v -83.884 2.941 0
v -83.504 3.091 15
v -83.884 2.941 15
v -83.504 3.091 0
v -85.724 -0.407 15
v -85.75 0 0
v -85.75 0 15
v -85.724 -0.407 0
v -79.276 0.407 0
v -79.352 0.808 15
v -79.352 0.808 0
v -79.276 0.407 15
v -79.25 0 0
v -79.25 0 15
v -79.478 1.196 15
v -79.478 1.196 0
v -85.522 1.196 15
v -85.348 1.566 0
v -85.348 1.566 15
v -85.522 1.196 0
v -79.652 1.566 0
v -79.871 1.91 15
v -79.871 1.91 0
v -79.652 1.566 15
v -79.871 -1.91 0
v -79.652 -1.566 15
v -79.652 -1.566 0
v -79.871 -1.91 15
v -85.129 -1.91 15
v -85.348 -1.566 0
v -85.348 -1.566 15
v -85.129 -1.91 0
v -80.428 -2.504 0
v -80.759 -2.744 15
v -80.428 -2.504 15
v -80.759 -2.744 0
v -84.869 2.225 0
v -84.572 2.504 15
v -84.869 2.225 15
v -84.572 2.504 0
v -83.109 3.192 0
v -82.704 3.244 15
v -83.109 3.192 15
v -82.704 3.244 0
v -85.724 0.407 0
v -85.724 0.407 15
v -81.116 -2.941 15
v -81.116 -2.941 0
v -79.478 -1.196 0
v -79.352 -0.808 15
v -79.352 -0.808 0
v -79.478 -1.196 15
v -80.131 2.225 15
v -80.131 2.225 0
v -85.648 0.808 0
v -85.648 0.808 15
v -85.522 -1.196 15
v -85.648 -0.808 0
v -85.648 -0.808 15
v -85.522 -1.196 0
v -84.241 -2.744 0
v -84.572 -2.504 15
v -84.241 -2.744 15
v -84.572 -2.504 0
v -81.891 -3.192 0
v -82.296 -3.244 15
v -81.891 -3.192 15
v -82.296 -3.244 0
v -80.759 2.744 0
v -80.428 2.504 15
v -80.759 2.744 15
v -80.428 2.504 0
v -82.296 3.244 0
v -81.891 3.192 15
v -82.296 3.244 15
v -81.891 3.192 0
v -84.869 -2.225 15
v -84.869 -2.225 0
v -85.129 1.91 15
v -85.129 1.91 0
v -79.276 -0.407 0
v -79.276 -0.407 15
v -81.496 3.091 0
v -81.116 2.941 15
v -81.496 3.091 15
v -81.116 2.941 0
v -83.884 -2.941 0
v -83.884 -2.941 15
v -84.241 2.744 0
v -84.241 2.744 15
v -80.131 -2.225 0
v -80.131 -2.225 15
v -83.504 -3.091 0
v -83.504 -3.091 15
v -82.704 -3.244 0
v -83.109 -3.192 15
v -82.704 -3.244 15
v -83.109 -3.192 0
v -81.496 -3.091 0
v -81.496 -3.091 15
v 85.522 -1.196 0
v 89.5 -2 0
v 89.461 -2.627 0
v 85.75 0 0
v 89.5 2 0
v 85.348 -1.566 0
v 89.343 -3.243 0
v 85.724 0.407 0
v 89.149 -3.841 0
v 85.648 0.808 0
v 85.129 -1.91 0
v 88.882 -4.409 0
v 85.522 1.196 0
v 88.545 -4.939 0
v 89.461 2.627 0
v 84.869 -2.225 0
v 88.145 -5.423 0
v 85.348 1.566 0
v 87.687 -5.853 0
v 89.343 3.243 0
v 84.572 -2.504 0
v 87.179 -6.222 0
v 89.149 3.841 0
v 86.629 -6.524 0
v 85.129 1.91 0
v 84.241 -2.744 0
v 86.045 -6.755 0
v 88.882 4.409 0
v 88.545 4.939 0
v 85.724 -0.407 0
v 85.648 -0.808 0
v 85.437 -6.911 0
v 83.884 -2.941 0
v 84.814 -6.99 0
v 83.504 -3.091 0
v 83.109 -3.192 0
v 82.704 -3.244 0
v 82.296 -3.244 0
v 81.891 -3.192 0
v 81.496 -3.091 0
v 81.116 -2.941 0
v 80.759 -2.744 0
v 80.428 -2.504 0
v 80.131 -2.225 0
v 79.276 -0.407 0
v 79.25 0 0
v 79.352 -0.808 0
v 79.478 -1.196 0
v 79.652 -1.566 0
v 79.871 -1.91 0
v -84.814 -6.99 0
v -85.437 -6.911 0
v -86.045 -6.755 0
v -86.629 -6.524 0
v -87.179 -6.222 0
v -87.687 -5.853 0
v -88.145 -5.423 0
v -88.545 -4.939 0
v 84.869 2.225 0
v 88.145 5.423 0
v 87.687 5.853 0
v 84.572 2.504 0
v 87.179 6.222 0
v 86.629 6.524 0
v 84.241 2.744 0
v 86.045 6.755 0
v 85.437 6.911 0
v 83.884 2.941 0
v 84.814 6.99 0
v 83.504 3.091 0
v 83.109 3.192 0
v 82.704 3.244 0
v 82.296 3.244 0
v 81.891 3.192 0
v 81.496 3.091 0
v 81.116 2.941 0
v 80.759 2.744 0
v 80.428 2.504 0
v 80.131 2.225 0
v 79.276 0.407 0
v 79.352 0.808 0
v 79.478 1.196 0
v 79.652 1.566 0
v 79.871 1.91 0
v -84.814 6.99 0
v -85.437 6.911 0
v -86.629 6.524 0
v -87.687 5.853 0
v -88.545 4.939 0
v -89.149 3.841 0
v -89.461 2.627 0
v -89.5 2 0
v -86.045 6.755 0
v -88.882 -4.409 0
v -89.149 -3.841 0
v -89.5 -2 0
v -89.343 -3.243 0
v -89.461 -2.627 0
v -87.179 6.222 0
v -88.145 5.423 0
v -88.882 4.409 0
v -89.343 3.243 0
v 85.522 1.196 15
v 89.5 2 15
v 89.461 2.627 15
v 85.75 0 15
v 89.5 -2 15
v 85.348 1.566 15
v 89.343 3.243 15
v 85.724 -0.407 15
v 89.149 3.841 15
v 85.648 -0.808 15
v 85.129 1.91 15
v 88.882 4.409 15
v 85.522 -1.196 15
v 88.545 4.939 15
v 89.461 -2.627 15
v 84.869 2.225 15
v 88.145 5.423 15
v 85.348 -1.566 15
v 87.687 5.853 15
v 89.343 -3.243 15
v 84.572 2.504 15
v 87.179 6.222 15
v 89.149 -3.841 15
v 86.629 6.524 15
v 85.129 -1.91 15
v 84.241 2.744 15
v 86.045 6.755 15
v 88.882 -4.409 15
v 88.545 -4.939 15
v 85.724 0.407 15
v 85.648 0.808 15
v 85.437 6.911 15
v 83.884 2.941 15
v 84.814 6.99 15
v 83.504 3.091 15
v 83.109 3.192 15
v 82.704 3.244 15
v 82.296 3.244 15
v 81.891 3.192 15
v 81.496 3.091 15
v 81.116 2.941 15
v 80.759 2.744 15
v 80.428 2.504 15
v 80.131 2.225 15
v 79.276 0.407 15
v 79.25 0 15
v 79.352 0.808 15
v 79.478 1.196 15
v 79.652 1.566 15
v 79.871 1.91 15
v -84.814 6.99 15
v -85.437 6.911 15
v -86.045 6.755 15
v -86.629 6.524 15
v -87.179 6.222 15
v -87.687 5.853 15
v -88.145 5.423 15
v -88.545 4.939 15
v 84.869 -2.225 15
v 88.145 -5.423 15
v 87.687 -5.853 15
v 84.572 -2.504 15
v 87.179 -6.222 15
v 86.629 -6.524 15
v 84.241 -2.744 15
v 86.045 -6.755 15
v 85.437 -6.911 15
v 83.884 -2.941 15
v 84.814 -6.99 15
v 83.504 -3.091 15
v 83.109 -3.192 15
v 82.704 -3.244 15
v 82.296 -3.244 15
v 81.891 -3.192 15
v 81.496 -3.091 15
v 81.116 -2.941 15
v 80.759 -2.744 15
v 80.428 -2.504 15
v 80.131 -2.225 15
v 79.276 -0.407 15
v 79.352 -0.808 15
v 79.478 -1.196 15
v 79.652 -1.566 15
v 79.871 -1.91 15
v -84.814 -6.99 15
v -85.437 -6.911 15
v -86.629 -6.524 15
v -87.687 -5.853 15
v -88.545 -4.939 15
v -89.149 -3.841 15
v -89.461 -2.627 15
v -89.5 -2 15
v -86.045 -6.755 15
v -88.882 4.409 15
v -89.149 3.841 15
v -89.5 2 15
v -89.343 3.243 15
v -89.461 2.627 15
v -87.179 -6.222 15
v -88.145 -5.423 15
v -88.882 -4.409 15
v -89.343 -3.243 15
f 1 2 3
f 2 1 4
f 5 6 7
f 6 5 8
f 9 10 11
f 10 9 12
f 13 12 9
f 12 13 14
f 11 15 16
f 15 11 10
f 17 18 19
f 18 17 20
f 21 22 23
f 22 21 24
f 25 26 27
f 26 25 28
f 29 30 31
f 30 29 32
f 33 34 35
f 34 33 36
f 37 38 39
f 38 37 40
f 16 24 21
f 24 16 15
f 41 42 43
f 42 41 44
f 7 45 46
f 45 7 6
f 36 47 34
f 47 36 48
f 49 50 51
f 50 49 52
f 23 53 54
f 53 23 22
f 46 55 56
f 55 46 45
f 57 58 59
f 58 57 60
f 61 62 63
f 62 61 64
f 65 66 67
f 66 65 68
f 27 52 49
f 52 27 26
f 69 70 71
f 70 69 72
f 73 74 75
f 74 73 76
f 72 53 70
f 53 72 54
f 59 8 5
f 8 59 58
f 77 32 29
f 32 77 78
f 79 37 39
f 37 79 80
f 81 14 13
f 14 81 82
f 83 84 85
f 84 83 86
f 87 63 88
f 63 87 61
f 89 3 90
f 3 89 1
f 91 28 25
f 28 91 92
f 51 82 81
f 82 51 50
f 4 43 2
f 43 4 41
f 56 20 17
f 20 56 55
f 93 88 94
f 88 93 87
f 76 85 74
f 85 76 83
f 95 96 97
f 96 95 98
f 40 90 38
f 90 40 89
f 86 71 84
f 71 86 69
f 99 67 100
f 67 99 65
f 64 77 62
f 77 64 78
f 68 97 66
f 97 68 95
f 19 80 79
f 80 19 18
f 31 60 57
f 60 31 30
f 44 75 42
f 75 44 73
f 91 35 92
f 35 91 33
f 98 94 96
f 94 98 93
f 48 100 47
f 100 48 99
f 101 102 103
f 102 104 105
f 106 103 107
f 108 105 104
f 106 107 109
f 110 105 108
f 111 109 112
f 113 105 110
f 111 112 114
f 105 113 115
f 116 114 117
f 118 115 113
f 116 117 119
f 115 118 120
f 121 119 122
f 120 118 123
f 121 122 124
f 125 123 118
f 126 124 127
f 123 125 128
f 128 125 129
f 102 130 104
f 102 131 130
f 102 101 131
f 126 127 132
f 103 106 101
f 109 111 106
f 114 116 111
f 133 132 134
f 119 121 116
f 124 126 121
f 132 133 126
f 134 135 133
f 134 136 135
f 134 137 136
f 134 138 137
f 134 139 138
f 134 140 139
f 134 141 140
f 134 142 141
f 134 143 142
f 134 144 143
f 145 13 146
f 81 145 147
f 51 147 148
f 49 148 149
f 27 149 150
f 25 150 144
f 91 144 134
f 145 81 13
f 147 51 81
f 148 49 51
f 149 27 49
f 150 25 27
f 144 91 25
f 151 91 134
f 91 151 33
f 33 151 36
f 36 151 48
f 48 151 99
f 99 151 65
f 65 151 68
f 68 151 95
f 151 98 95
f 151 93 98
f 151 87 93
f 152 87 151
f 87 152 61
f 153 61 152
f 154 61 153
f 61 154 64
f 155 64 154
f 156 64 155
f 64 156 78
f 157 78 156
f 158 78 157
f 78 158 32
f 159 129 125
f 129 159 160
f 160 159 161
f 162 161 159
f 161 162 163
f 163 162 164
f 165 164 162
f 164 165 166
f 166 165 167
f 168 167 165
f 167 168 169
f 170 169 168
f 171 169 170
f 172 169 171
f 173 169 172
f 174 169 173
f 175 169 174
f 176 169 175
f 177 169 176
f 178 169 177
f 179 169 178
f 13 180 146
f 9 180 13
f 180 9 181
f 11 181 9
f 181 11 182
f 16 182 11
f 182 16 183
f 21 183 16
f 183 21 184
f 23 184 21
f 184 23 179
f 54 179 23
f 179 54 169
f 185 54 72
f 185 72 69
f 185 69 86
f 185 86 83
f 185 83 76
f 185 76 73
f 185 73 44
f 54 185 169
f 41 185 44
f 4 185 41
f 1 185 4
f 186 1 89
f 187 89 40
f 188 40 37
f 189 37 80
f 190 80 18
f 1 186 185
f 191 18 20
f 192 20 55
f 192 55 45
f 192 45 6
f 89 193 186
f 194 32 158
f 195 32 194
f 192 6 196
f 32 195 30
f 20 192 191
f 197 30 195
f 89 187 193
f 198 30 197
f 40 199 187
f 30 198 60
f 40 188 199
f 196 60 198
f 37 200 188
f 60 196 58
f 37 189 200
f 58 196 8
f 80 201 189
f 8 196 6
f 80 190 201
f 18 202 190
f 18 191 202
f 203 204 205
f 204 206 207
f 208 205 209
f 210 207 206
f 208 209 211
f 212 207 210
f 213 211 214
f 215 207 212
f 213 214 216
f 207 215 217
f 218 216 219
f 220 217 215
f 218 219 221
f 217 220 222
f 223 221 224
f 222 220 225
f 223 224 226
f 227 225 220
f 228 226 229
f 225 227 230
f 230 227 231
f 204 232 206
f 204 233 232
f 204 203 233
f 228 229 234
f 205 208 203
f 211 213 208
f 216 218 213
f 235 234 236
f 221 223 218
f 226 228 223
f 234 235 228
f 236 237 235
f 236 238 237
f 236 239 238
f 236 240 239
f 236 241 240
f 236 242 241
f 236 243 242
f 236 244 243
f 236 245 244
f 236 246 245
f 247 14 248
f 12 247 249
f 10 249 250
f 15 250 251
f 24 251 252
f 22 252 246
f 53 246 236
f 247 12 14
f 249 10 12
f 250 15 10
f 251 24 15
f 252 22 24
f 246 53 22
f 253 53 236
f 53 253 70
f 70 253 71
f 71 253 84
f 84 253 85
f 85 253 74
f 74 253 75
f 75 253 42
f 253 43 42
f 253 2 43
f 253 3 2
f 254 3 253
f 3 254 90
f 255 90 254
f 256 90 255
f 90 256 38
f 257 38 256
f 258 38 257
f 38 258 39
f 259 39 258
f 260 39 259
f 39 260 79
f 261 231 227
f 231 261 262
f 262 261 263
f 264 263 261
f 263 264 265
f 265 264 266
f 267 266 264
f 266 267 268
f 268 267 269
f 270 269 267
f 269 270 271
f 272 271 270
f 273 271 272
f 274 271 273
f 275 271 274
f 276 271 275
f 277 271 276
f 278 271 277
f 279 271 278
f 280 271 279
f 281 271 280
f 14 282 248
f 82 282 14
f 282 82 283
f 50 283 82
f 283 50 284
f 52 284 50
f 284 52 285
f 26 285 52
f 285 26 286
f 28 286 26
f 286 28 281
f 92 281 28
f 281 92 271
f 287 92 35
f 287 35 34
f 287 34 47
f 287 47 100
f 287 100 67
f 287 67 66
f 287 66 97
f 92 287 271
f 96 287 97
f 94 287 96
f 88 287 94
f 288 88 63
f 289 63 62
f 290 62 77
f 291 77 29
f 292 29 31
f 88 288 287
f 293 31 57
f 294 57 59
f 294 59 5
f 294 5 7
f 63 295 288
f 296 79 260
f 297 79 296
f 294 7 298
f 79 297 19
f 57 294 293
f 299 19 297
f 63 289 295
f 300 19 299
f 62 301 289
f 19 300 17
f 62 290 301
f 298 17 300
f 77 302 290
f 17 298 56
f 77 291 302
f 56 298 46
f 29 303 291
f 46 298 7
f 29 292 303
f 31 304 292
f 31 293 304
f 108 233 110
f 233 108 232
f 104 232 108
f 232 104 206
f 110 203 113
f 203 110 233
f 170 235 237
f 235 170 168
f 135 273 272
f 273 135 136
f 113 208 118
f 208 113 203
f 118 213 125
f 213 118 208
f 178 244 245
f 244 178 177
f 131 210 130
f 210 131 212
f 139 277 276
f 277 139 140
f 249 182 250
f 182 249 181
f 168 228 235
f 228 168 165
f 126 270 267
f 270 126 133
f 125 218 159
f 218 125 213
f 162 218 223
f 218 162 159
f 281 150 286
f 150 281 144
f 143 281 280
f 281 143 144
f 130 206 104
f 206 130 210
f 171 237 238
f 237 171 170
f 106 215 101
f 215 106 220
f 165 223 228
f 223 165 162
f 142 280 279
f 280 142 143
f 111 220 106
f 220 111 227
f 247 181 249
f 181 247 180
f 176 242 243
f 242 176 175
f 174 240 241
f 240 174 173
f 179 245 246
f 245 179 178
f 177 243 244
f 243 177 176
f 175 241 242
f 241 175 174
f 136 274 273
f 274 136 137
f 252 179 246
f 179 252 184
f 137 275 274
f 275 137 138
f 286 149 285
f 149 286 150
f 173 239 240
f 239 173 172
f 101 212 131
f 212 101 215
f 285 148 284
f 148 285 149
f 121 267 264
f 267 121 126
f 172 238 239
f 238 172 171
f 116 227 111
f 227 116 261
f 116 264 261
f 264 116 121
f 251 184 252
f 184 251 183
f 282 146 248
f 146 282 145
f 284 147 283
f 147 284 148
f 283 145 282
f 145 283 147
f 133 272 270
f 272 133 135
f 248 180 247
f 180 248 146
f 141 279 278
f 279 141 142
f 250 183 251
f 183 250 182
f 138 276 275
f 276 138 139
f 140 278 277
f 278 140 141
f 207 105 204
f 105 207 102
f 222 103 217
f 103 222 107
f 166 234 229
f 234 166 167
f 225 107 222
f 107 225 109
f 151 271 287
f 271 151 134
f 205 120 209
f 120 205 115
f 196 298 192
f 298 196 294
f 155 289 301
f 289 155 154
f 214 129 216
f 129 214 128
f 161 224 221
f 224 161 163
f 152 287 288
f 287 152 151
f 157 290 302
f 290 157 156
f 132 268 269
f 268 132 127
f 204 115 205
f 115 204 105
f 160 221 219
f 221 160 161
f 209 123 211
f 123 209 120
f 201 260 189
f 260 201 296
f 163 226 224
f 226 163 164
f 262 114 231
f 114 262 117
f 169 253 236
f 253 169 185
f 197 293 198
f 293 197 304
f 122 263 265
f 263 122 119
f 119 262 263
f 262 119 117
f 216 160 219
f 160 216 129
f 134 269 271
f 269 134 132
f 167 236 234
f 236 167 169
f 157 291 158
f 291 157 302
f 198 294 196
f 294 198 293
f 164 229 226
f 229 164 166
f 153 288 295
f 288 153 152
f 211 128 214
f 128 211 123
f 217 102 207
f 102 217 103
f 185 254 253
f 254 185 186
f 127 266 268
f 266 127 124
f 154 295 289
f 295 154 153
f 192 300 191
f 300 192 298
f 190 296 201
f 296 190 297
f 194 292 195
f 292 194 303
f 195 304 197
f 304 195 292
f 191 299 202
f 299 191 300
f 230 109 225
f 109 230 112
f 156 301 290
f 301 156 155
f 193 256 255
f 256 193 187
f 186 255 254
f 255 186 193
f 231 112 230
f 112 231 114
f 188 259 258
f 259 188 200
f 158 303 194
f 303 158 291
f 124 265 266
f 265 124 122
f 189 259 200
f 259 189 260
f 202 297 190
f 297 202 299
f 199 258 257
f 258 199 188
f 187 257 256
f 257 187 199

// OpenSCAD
$fn = 50;


difference() {
	union() {
		hull() {
			translate(v = [-84.5000000000, 2.0000000000, 0]) {
				cylinder(h = 15, r = 5);
			}
			translate(v = [84.5000000000, 2.0000000000, 0]) {
				cylinder(h = 15, r = 5);
			}
			translate(v = [-84.5000000000, -2.0000000000, 0]) {
				cylinder(h = 15, r = 5);
			}
			translate(v = [84.5000000000, -2.0000000000, 0]) {
				cylinder(h = 15, r = 5);
			}
		}
	}
	union() {
		translate(v = [-82.5000000000, 0.0000000000, 0]) {
			cylinder(h = 15, r = 3.2500000000);
		}
		translate(v = [82.5000000000, 0.0000000000, 0]) {
			cylinder(h = 15, r = 3.2500000000);
		}
		translate(v = [-82.5000000000, 0.0000000000, 0]) {
			cylinder(h = 15, r = 1.8000000000);
		}
		translate(v = [82.5000000000, 0.0000000000, 0]) {
			cylinder(h = 15, r = 1.8000000000);
		}
		translate(v = [-82.5000000000, 0.0000000000, 0]) {
			cylinder(h = 15, r = 1.8000000000);
		}
		translate(v = [82.5000000000, 0.0000000000, 0]) {
			cylinder(h = 15, r = 1.8000000000);
		}
		translate(v = [-82.5000000000, 0.0000000000, 0]) {
			cylinder(h = 15, r = 1.8000000000);
		}
		translate(v = [82.5000000000, 0.0000000000, 0]) {
			cylinder(h = 15, r = 1.8000000000);
		}
	}
}
